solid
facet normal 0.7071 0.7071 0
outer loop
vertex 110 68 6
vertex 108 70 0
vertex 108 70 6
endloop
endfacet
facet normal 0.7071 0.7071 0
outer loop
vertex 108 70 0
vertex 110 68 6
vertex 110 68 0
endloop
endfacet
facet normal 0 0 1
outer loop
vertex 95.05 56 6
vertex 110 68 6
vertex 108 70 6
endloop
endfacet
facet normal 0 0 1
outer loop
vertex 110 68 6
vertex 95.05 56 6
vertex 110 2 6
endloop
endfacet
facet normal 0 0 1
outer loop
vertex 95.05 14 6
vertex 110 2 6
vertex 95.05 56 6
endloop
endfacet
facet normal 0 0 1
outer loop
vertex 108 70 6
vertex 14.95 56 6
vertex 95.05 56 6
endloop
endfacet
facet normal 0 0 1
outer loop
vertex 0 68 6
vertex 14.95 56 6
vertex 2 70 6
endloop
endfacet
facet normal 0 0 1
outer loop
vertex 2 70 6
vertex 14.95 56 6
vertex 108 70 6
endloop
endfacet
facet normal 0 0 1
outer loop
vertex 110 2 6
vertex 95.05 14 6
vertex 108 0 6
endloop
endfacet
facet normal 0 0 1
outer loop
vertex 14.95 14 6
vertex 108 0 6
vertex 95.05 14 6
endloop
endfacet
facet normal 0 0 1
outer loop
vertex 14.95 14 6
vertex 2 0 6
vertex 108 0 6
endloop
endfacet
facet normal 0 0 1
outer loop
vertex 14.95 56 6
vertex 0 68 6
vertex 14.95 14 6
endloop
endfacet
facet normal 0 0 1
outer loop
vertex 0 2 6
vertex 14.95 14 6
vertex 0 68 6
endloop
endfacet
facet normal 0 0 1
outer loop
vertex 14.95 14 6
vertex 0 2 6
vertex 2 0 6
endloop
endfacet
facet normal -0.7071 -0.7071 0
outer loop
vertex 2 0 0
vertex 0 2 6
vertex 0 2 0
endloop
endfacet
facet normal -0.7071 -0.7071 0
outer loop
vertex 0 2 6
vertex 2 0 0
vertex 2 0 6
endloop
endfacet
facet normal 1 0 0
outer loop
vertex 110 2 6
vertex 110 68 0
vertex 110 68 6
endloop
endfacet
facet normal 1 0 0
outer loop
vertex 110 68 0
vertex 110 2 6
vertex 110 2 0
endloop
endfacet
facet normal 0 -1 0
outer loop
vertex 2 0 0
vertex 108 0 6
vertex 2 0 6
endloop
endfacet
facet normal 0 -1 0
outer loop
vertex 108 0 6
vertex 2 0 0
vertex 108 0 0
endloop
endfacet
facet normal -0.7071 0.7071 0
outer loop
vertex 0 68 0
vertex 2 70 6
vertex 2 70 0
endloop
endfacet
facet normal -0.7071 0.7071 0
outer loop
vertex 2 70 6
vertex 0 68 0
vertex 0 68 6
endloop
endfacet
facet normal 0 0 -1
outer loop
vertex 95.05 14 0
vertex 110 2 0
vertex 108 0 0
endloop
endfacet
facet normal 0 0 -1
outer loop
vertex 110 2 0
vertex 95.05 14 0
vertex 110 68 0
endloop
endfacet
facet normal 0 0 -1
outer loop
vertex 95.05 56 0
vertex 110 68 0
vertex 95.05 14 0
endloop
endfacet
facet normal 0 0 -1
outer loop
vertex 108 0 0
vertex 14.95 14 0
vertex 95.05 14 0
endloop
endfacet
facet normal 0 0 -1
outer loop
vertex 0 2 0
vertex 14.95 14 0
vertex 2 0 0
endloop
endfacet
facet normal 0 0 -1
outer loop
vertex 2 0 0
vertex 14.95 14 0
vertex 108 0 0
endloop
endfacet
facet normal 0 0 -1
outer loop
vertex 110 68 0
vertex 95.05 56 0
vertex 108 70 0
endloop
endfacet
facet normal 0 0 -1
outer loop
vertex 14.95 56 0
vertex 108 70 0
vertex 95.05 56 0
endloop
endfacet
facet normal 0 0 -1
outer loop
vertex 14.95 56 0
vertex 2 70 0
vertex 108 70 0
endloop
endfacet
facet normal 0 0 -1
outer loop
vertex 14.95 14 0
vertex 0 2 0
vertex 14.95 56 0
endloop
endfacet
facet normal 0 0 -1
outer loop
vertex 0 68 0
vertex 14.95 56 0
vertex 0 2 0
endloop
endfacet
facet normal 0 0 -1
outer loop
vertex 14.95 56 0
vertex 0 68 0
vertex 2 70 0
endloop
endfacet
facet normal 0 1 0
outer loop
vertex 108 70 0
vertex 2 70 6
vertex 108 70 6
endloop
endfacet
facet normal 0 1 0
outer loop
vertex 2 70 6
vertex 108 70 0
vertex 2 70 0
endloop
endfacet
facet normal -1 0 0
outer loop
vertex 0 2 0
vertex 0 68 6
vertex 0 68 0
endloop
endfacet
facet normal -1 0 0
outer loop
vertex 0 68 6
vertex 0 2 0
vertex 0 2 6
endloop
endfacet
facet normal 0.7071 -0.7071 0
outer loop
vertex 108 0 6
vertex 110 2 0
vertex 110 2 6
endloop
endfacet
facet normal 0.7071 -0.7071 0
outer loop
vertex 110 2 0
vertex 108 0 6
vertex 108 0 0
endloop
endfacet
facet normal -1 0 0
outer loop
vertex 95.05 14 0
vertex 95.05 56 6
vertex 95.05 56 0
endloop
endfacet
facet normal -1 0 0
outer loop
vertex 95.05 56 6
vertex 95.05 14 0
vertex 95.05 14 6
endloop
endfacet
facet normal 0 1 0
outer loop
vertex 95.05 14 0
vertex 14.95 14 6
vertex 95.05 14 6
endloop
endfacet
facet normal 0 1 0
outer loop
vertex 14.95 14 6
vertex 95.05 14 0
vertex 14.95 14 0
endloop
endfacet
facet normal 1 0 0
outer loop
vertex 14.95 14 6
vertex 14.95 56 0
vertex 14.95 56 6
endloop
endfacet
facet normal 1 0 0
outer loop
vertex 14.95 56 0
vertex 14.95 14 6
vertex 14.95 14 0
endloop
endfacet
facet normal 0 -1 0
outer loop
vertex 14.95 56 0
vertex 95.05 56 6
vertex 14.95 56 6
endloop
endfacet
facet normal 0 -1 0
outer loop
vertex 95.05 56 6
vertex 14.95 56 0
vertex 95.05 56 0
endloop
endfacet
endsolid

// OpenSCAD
$fn = 32;

// ----------------------------------------------------------------------
// Windowed plate: 1 voids, 110 x 70 x 6 mm
// ----------------------------------------------------------------------

// --- parameters (mm) ---
plate_l = 110;            // plate length, X
plate_w = 70;             // plate width, Y
plate_t = 6;              // plate thickness, Z
edge_margin = 10;         // wall from the plate edge to any window
win1_l = 80.1;            // window length
win1_w = 42;              // window width
depth_1 = 6;              // depth of void 1 (full thickness = through)
corner_c = 2;             // corner chamfer of the plate

profile = [[2, 0], [108, 0], [110, 2], [110, 68], [108, 70], [2, 70], [0, 68], [0, 2]];  // primary outline, 8 points, counter clockwise
void_1 = [[14.95, 14], [95.05, 14], [95.05, 56], [14.95, 56]];  // large central window, 4 points

// --- the one profile operation ---
difference() {
  linear_extrude(height = plate_t) polygon(points = profile);
  translate([0, 0, -1])
    linear_extrude(height = plate_t + 2) polygon(points = void_1);
}
